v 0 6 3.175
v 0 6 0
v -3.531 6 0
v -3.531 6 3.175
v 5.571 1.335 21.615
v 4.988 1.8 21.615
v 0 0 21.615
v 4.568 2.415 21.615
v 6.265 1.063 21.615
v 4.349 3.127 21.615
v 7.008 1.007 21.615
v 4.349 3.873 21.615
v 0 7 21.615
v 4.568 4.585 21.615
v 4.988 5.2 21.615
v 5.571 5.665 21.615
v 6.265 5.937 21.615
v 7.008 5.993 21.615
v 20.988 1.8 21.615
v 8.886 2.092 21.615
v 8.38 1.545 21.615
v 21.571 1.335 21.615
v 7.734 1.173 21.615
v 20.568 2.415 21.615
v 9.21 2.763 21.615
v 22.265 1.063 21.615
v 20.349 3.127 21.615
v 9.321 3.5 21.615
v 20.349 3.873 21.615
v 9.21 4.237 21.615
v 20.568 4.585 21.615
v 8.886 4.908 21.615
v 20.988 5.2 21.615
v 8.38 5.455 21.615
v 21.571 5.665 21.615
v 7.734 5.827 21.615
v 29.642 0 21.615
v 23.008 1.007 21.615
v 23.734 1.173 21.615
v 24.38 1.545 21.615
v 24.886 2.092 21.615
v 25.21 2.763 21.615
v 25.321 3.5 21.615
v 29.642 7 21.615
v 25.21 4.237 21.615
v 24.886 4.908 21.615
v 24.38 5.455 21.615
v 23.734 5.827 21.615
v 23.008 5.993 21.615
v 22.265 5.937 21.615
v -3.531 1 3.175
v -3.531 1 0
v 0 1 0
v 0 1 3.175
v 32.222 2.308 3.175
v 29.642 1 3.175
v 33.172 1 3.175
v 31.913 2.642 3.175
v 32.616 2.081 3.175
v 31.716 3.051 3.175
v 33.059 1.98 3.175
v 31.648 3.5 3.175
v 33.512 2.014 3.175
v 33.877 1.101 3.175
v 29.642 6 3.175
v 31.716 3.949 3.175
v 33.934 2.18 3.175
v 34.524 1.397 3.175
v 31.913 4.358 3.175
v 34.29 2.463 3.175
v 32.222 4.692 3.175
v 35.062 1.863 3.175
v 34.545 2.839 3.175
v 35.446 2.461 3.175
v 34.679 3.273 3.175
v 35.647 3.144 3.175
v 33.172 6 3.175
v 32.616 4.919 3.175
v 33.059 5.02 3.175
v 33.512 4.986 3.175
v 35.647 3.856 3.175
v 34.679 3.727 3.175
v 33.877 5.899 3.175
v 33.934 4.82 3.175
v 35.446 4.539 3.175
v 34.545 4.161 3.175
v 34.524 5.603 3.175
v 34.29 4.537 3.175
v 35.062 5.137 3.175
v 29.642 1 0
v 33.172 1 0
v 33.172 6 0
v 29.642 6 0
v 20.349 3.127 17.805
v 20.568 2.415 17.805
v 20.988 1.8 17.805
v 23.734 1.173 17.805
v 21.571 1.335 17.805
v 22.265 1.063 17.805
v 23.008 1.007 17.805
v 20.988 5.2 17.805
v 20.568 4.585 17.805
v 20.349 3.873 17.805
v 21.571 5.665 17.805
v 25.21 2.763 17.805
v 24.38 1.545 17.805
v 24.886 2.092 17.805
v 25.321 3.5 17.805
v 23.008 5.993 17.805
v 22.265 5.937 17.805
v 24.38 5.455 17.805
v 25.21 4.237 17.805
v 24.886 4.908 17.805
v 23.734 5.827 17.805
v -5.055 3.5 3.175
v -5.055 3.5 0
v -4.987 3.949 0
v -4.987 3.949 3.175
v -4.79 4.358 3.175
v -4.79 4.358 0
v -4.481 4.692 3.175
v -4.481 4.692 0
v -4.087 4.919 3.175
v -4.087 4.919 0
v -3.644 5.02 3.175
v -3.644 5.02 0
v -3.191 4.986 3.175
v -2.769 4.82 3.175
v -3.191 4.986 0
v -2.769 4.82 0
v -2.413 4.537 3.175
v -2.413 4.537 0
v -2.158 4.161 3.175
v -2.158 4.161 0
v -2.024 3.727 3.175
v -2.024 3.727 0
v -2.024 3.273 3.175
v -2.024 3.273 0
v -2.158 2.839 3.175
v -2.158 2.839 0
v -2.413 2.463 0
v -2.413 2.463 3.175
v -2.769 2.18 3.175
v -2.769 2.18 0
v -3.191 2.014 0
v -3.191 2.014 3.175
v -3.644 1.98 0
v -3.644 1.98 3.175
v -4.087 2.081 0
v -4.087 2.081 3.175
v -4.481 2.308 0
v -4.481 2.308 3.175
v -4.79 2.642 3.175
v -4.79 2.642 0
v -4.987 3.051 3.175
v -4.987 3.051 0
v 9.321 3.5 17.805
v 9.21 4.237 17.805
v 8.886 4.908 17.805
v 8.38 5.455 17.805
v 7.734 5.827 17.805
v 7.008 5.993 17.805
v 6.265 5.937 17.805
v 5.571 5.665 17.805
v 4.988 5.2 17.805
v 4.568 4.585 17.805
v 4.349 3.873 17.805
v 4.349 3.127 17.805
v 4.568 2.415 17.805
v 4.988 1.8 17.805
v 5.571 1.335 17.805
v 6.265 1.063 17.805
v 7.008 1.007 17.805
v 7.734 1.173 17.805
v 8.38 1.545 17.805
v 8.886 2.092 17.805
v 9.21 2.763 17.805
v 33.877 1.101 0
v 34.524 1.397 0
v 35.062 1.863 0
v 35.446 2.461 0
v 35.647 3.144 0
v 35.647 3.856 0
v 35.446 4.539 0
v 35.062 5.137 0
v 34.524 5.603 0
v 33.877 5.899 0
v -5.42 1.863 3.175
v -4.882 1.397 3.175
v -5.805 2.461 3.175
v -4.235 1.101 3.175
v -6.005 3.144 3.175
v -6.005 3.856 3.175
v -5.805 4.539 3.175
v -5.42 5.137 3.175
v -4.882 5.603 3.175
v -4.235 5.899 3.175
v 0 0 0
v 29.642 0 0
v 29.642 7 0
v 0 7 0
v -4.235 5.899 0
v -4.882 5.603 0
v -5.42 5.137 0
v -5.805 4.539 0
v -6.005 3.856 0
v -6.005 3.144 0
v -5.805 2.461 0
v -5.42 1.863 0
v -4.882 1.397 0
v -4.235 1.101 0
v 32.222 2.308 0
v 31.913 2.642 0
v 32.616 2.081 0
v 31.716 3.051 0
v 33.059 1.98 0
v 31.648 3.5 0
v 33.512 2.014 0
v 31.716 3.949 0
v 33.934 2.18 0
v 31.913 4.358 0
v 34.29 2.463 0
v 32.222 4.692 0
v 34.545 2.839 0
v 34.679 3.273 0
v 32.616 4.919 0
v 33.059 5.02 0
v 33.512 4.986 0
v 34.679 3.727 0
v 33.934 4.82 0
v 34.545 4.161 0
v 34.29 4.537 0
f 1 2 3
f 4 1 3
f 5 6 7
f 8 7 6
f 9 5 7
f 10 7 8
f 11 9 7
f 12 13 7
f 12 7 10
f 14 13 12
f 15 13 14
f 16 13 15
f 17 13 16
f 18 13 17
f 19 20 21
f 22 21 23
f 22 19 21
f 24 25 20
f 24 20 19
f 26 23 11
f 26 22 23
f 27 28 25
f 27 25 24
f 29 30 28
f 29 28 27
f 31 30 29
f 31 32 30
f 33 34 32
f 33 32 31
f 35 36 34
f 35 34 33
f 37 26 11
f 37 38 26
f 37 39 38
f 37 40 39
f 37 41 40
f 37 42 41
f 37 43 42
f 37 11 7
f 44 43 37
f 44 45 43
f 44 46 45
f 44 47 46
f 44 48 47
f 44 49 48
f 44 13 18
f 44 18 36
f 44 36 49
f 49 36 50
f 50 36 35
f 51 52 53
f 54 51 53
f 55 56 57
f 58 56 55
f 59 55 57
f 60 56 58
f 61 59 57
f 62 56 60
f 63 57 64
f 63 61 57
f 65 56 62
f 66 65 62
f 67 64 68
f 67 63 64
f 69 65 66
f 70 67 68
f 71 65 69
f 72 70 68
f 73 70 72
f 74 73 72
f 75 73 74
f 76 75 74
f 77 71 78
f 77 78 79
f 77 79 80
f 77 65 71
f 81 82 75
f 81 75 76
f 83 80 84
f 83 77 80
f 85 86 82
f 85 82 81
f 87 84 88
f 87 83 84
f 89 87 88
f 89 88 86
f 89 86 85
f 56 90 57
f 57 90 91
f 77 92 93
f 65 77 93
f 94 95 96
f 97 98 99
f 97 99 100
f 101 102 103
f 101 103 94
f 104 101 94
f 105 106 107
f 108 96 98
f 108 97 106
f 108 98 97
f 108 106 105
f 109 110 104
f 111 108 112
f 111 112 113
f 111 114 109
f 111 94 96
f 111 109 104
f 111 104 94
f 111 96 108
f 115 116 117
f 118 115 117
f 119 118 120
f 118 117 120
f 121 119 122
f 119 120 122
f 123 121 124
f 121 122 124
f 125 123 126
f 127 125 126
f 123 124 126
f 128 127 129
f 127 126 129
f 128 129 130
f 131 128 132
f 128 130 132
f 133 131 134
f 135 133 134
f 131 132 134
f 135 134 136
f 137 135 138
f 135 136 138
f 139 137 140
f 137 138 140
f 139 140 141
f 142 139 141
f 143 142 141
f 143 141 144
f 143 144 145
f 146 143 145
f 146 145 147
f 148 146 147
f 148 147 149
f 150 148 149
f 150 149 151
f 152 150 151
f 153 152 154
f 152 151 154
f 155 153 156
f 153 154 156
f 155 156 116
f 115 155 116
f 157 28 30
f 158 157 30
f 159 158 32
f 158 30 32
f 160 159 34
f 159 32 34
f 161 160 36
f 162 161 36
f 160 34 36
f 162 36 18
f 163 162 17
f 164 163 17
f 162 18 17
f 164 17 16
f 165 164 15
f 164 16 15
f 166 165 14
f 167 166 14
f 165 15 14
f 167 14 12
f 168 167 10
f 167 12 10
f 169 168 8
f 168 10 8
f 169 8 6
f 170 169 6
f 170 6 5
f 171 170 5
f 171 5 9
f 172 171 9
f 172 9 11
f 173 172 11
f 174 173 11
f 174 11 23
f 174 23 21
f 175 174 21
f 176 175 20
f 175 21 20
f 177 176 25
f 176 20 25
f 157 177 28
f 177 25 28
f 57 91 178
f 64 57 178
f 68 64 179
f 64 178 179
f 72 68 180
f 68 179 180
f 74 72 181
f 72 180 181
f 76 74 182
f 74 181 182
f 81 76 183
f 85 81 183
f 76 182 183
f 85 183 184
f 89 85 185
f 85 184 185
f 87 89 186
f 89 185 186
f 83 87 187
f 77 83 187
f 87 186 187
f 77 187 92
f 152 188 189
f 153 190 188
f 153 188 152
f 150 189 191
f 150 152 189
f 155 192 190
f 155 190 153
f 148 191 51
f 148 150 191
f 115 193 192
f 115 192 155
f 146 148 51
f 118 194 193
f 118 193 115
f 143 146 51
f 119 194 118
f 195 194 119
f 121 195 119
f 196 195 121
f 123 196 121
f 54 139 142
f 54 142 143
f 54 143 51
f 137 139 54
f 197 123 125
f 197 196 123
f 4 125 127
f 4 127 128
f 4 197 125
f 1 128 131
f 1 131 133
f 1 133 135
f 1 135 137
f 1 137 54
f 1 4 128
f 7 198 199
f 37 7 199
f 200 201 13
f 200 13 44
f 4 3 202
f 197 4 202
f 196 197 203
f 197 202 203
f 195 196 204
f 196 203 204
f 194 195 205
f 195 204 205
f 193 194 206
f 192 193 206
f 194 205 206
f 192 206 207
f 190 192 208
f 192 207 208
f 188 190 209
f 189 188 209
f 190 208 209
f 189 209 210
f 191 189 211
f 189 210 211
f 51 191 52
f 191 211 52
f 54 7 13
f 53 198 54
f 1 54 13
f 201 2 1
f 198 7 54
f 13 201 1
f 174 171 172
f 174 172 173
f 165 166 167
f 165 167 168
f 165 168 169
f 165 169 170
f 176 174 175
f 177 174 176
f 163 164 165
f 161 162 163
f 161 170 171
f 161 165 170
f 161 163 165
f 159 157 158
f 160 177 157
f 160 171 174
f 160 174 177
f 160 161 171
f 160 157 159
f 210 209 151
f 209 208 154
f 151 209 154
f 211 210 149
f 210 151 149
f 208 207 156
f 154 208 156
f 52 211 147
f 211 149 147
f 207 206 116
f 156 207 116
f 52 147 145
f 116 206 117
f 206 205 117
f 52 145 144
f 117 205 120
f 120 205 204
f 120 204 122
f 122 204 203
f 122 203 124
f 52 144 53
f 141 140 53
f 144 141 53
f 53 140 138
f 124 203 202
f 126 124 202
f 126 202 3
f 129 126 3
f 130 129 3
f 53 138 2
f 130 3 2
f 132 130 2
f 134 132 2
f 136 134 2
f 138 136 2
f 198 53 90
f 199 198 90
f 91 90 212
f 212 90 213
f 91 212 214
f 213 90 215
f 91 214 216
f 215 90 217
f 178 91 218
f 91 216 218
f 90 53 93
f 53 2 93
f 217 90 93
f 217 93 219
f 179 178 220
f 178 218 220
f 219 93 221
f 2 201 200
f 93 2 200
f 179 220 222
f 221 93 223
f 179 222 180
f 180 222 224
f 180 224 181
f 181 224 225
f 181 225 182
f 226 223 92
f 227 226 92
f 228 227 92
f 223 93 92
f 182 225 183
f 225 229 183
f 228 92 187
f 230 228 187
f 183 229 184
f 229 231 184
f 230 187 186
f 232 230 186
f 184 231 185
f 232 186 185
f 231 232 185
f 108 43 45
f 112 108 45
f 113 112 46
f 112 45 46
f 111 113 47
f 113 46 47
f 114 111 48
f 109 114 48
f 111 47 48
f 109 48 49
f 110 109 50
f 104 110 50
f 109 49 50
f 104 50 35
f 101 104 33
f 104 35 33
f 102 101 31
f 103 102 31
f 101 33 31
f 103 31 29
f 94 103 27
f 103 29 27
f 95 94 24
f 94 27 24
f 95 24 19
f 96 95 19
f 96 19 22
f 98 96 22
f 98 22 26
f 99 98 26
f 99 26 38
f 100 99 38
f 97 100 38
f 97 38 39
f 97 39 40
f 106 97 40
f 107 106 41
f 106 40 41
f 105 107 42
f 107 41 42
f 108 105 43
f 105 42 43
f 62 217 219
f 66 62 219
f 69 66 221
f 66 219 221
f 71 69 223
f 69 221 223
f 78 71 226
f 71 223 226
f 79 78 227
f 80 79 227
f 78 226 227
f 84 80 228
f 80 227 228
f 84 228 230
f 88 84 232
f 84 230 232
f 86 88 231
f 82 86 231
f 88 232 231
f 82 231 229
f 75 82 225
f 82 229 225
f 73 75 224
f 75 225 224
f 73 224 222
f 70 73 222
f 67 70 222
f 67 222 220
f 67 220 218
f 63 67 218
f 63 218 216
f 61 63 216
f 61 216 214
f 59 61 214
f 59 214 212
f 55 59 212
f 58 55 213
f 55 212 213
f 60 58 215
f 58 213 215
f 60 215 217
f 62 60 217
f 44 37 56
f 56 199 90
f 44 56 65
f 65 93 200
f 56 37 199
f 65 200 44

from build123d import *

# Parameters (mm, degrees)
SKETCH1_W           = 29.6418
SKETCH1_H           = 7
BOSS_EXTRUDE1_DEPTH = 21.6154
SKETCH2_R           = 1.524
BOSS_EXTRUDE2_DEPTH = 3.175
SKETCH3_R           = 2.5
CUT_EXTRUDE1_DEPTH  = 3.81


with BuildPart() as part:
    # Sketch1 → Boss-Extrude1 (new body)
    with BuildSketch(Plane.XY):
        with Locations((14.8209, 3.5)):
            Rectangle(SKETCH1_W, SKETCH1_H)
    extrude(amount=BOSS_EXTRUDE1_DEPTH)

    # Sketch2 → Boss-Extrude2 (add)
    with BuildSketch(Plane(origin=(0, 0, 0), x_dir=(-1, 0, 0), z_dir=(0, 0, -1))):
        with BuildLine():
            Line((-33.1724, 6), (3.5306, 6))
            ThreePointArc((3.5306, 6), (6.0306, 3.5), (3.5306, 1))
            Line((3.5306, 1), (-33.1724, 1))
            ThreePointArc((-33.1724, 1), (-35.6724, 3.5), (-33.1724, 6))
        make_face()
        with Locations((-33.1724, 3.5)):
            Circle(SKETCH2_R, mode=Mode.SUBTRACT)
        with Locations((3.5306, 3.5)):
            Circle(SKETCH2_R, mode=Mode.SUBTRACT)
    extrude(amount=-BOSS_EXTRUDE2_DEPTH)

    # Sketch3 → Cut-Extrude1 (cut)
    with BuildSketch(Plane.XY.offset(21.6154)):
        with Locations((6.8209, 3.5)):
            Circle(SKETCH3_R)
        with Locations((22.8209, 3.5)):
            Circle(SKETCH3_R)
    extrude(amount=-CUT_EXTRUDE1_DEPTH, mode=Mode.SUBTRACT)


solid = part.part
